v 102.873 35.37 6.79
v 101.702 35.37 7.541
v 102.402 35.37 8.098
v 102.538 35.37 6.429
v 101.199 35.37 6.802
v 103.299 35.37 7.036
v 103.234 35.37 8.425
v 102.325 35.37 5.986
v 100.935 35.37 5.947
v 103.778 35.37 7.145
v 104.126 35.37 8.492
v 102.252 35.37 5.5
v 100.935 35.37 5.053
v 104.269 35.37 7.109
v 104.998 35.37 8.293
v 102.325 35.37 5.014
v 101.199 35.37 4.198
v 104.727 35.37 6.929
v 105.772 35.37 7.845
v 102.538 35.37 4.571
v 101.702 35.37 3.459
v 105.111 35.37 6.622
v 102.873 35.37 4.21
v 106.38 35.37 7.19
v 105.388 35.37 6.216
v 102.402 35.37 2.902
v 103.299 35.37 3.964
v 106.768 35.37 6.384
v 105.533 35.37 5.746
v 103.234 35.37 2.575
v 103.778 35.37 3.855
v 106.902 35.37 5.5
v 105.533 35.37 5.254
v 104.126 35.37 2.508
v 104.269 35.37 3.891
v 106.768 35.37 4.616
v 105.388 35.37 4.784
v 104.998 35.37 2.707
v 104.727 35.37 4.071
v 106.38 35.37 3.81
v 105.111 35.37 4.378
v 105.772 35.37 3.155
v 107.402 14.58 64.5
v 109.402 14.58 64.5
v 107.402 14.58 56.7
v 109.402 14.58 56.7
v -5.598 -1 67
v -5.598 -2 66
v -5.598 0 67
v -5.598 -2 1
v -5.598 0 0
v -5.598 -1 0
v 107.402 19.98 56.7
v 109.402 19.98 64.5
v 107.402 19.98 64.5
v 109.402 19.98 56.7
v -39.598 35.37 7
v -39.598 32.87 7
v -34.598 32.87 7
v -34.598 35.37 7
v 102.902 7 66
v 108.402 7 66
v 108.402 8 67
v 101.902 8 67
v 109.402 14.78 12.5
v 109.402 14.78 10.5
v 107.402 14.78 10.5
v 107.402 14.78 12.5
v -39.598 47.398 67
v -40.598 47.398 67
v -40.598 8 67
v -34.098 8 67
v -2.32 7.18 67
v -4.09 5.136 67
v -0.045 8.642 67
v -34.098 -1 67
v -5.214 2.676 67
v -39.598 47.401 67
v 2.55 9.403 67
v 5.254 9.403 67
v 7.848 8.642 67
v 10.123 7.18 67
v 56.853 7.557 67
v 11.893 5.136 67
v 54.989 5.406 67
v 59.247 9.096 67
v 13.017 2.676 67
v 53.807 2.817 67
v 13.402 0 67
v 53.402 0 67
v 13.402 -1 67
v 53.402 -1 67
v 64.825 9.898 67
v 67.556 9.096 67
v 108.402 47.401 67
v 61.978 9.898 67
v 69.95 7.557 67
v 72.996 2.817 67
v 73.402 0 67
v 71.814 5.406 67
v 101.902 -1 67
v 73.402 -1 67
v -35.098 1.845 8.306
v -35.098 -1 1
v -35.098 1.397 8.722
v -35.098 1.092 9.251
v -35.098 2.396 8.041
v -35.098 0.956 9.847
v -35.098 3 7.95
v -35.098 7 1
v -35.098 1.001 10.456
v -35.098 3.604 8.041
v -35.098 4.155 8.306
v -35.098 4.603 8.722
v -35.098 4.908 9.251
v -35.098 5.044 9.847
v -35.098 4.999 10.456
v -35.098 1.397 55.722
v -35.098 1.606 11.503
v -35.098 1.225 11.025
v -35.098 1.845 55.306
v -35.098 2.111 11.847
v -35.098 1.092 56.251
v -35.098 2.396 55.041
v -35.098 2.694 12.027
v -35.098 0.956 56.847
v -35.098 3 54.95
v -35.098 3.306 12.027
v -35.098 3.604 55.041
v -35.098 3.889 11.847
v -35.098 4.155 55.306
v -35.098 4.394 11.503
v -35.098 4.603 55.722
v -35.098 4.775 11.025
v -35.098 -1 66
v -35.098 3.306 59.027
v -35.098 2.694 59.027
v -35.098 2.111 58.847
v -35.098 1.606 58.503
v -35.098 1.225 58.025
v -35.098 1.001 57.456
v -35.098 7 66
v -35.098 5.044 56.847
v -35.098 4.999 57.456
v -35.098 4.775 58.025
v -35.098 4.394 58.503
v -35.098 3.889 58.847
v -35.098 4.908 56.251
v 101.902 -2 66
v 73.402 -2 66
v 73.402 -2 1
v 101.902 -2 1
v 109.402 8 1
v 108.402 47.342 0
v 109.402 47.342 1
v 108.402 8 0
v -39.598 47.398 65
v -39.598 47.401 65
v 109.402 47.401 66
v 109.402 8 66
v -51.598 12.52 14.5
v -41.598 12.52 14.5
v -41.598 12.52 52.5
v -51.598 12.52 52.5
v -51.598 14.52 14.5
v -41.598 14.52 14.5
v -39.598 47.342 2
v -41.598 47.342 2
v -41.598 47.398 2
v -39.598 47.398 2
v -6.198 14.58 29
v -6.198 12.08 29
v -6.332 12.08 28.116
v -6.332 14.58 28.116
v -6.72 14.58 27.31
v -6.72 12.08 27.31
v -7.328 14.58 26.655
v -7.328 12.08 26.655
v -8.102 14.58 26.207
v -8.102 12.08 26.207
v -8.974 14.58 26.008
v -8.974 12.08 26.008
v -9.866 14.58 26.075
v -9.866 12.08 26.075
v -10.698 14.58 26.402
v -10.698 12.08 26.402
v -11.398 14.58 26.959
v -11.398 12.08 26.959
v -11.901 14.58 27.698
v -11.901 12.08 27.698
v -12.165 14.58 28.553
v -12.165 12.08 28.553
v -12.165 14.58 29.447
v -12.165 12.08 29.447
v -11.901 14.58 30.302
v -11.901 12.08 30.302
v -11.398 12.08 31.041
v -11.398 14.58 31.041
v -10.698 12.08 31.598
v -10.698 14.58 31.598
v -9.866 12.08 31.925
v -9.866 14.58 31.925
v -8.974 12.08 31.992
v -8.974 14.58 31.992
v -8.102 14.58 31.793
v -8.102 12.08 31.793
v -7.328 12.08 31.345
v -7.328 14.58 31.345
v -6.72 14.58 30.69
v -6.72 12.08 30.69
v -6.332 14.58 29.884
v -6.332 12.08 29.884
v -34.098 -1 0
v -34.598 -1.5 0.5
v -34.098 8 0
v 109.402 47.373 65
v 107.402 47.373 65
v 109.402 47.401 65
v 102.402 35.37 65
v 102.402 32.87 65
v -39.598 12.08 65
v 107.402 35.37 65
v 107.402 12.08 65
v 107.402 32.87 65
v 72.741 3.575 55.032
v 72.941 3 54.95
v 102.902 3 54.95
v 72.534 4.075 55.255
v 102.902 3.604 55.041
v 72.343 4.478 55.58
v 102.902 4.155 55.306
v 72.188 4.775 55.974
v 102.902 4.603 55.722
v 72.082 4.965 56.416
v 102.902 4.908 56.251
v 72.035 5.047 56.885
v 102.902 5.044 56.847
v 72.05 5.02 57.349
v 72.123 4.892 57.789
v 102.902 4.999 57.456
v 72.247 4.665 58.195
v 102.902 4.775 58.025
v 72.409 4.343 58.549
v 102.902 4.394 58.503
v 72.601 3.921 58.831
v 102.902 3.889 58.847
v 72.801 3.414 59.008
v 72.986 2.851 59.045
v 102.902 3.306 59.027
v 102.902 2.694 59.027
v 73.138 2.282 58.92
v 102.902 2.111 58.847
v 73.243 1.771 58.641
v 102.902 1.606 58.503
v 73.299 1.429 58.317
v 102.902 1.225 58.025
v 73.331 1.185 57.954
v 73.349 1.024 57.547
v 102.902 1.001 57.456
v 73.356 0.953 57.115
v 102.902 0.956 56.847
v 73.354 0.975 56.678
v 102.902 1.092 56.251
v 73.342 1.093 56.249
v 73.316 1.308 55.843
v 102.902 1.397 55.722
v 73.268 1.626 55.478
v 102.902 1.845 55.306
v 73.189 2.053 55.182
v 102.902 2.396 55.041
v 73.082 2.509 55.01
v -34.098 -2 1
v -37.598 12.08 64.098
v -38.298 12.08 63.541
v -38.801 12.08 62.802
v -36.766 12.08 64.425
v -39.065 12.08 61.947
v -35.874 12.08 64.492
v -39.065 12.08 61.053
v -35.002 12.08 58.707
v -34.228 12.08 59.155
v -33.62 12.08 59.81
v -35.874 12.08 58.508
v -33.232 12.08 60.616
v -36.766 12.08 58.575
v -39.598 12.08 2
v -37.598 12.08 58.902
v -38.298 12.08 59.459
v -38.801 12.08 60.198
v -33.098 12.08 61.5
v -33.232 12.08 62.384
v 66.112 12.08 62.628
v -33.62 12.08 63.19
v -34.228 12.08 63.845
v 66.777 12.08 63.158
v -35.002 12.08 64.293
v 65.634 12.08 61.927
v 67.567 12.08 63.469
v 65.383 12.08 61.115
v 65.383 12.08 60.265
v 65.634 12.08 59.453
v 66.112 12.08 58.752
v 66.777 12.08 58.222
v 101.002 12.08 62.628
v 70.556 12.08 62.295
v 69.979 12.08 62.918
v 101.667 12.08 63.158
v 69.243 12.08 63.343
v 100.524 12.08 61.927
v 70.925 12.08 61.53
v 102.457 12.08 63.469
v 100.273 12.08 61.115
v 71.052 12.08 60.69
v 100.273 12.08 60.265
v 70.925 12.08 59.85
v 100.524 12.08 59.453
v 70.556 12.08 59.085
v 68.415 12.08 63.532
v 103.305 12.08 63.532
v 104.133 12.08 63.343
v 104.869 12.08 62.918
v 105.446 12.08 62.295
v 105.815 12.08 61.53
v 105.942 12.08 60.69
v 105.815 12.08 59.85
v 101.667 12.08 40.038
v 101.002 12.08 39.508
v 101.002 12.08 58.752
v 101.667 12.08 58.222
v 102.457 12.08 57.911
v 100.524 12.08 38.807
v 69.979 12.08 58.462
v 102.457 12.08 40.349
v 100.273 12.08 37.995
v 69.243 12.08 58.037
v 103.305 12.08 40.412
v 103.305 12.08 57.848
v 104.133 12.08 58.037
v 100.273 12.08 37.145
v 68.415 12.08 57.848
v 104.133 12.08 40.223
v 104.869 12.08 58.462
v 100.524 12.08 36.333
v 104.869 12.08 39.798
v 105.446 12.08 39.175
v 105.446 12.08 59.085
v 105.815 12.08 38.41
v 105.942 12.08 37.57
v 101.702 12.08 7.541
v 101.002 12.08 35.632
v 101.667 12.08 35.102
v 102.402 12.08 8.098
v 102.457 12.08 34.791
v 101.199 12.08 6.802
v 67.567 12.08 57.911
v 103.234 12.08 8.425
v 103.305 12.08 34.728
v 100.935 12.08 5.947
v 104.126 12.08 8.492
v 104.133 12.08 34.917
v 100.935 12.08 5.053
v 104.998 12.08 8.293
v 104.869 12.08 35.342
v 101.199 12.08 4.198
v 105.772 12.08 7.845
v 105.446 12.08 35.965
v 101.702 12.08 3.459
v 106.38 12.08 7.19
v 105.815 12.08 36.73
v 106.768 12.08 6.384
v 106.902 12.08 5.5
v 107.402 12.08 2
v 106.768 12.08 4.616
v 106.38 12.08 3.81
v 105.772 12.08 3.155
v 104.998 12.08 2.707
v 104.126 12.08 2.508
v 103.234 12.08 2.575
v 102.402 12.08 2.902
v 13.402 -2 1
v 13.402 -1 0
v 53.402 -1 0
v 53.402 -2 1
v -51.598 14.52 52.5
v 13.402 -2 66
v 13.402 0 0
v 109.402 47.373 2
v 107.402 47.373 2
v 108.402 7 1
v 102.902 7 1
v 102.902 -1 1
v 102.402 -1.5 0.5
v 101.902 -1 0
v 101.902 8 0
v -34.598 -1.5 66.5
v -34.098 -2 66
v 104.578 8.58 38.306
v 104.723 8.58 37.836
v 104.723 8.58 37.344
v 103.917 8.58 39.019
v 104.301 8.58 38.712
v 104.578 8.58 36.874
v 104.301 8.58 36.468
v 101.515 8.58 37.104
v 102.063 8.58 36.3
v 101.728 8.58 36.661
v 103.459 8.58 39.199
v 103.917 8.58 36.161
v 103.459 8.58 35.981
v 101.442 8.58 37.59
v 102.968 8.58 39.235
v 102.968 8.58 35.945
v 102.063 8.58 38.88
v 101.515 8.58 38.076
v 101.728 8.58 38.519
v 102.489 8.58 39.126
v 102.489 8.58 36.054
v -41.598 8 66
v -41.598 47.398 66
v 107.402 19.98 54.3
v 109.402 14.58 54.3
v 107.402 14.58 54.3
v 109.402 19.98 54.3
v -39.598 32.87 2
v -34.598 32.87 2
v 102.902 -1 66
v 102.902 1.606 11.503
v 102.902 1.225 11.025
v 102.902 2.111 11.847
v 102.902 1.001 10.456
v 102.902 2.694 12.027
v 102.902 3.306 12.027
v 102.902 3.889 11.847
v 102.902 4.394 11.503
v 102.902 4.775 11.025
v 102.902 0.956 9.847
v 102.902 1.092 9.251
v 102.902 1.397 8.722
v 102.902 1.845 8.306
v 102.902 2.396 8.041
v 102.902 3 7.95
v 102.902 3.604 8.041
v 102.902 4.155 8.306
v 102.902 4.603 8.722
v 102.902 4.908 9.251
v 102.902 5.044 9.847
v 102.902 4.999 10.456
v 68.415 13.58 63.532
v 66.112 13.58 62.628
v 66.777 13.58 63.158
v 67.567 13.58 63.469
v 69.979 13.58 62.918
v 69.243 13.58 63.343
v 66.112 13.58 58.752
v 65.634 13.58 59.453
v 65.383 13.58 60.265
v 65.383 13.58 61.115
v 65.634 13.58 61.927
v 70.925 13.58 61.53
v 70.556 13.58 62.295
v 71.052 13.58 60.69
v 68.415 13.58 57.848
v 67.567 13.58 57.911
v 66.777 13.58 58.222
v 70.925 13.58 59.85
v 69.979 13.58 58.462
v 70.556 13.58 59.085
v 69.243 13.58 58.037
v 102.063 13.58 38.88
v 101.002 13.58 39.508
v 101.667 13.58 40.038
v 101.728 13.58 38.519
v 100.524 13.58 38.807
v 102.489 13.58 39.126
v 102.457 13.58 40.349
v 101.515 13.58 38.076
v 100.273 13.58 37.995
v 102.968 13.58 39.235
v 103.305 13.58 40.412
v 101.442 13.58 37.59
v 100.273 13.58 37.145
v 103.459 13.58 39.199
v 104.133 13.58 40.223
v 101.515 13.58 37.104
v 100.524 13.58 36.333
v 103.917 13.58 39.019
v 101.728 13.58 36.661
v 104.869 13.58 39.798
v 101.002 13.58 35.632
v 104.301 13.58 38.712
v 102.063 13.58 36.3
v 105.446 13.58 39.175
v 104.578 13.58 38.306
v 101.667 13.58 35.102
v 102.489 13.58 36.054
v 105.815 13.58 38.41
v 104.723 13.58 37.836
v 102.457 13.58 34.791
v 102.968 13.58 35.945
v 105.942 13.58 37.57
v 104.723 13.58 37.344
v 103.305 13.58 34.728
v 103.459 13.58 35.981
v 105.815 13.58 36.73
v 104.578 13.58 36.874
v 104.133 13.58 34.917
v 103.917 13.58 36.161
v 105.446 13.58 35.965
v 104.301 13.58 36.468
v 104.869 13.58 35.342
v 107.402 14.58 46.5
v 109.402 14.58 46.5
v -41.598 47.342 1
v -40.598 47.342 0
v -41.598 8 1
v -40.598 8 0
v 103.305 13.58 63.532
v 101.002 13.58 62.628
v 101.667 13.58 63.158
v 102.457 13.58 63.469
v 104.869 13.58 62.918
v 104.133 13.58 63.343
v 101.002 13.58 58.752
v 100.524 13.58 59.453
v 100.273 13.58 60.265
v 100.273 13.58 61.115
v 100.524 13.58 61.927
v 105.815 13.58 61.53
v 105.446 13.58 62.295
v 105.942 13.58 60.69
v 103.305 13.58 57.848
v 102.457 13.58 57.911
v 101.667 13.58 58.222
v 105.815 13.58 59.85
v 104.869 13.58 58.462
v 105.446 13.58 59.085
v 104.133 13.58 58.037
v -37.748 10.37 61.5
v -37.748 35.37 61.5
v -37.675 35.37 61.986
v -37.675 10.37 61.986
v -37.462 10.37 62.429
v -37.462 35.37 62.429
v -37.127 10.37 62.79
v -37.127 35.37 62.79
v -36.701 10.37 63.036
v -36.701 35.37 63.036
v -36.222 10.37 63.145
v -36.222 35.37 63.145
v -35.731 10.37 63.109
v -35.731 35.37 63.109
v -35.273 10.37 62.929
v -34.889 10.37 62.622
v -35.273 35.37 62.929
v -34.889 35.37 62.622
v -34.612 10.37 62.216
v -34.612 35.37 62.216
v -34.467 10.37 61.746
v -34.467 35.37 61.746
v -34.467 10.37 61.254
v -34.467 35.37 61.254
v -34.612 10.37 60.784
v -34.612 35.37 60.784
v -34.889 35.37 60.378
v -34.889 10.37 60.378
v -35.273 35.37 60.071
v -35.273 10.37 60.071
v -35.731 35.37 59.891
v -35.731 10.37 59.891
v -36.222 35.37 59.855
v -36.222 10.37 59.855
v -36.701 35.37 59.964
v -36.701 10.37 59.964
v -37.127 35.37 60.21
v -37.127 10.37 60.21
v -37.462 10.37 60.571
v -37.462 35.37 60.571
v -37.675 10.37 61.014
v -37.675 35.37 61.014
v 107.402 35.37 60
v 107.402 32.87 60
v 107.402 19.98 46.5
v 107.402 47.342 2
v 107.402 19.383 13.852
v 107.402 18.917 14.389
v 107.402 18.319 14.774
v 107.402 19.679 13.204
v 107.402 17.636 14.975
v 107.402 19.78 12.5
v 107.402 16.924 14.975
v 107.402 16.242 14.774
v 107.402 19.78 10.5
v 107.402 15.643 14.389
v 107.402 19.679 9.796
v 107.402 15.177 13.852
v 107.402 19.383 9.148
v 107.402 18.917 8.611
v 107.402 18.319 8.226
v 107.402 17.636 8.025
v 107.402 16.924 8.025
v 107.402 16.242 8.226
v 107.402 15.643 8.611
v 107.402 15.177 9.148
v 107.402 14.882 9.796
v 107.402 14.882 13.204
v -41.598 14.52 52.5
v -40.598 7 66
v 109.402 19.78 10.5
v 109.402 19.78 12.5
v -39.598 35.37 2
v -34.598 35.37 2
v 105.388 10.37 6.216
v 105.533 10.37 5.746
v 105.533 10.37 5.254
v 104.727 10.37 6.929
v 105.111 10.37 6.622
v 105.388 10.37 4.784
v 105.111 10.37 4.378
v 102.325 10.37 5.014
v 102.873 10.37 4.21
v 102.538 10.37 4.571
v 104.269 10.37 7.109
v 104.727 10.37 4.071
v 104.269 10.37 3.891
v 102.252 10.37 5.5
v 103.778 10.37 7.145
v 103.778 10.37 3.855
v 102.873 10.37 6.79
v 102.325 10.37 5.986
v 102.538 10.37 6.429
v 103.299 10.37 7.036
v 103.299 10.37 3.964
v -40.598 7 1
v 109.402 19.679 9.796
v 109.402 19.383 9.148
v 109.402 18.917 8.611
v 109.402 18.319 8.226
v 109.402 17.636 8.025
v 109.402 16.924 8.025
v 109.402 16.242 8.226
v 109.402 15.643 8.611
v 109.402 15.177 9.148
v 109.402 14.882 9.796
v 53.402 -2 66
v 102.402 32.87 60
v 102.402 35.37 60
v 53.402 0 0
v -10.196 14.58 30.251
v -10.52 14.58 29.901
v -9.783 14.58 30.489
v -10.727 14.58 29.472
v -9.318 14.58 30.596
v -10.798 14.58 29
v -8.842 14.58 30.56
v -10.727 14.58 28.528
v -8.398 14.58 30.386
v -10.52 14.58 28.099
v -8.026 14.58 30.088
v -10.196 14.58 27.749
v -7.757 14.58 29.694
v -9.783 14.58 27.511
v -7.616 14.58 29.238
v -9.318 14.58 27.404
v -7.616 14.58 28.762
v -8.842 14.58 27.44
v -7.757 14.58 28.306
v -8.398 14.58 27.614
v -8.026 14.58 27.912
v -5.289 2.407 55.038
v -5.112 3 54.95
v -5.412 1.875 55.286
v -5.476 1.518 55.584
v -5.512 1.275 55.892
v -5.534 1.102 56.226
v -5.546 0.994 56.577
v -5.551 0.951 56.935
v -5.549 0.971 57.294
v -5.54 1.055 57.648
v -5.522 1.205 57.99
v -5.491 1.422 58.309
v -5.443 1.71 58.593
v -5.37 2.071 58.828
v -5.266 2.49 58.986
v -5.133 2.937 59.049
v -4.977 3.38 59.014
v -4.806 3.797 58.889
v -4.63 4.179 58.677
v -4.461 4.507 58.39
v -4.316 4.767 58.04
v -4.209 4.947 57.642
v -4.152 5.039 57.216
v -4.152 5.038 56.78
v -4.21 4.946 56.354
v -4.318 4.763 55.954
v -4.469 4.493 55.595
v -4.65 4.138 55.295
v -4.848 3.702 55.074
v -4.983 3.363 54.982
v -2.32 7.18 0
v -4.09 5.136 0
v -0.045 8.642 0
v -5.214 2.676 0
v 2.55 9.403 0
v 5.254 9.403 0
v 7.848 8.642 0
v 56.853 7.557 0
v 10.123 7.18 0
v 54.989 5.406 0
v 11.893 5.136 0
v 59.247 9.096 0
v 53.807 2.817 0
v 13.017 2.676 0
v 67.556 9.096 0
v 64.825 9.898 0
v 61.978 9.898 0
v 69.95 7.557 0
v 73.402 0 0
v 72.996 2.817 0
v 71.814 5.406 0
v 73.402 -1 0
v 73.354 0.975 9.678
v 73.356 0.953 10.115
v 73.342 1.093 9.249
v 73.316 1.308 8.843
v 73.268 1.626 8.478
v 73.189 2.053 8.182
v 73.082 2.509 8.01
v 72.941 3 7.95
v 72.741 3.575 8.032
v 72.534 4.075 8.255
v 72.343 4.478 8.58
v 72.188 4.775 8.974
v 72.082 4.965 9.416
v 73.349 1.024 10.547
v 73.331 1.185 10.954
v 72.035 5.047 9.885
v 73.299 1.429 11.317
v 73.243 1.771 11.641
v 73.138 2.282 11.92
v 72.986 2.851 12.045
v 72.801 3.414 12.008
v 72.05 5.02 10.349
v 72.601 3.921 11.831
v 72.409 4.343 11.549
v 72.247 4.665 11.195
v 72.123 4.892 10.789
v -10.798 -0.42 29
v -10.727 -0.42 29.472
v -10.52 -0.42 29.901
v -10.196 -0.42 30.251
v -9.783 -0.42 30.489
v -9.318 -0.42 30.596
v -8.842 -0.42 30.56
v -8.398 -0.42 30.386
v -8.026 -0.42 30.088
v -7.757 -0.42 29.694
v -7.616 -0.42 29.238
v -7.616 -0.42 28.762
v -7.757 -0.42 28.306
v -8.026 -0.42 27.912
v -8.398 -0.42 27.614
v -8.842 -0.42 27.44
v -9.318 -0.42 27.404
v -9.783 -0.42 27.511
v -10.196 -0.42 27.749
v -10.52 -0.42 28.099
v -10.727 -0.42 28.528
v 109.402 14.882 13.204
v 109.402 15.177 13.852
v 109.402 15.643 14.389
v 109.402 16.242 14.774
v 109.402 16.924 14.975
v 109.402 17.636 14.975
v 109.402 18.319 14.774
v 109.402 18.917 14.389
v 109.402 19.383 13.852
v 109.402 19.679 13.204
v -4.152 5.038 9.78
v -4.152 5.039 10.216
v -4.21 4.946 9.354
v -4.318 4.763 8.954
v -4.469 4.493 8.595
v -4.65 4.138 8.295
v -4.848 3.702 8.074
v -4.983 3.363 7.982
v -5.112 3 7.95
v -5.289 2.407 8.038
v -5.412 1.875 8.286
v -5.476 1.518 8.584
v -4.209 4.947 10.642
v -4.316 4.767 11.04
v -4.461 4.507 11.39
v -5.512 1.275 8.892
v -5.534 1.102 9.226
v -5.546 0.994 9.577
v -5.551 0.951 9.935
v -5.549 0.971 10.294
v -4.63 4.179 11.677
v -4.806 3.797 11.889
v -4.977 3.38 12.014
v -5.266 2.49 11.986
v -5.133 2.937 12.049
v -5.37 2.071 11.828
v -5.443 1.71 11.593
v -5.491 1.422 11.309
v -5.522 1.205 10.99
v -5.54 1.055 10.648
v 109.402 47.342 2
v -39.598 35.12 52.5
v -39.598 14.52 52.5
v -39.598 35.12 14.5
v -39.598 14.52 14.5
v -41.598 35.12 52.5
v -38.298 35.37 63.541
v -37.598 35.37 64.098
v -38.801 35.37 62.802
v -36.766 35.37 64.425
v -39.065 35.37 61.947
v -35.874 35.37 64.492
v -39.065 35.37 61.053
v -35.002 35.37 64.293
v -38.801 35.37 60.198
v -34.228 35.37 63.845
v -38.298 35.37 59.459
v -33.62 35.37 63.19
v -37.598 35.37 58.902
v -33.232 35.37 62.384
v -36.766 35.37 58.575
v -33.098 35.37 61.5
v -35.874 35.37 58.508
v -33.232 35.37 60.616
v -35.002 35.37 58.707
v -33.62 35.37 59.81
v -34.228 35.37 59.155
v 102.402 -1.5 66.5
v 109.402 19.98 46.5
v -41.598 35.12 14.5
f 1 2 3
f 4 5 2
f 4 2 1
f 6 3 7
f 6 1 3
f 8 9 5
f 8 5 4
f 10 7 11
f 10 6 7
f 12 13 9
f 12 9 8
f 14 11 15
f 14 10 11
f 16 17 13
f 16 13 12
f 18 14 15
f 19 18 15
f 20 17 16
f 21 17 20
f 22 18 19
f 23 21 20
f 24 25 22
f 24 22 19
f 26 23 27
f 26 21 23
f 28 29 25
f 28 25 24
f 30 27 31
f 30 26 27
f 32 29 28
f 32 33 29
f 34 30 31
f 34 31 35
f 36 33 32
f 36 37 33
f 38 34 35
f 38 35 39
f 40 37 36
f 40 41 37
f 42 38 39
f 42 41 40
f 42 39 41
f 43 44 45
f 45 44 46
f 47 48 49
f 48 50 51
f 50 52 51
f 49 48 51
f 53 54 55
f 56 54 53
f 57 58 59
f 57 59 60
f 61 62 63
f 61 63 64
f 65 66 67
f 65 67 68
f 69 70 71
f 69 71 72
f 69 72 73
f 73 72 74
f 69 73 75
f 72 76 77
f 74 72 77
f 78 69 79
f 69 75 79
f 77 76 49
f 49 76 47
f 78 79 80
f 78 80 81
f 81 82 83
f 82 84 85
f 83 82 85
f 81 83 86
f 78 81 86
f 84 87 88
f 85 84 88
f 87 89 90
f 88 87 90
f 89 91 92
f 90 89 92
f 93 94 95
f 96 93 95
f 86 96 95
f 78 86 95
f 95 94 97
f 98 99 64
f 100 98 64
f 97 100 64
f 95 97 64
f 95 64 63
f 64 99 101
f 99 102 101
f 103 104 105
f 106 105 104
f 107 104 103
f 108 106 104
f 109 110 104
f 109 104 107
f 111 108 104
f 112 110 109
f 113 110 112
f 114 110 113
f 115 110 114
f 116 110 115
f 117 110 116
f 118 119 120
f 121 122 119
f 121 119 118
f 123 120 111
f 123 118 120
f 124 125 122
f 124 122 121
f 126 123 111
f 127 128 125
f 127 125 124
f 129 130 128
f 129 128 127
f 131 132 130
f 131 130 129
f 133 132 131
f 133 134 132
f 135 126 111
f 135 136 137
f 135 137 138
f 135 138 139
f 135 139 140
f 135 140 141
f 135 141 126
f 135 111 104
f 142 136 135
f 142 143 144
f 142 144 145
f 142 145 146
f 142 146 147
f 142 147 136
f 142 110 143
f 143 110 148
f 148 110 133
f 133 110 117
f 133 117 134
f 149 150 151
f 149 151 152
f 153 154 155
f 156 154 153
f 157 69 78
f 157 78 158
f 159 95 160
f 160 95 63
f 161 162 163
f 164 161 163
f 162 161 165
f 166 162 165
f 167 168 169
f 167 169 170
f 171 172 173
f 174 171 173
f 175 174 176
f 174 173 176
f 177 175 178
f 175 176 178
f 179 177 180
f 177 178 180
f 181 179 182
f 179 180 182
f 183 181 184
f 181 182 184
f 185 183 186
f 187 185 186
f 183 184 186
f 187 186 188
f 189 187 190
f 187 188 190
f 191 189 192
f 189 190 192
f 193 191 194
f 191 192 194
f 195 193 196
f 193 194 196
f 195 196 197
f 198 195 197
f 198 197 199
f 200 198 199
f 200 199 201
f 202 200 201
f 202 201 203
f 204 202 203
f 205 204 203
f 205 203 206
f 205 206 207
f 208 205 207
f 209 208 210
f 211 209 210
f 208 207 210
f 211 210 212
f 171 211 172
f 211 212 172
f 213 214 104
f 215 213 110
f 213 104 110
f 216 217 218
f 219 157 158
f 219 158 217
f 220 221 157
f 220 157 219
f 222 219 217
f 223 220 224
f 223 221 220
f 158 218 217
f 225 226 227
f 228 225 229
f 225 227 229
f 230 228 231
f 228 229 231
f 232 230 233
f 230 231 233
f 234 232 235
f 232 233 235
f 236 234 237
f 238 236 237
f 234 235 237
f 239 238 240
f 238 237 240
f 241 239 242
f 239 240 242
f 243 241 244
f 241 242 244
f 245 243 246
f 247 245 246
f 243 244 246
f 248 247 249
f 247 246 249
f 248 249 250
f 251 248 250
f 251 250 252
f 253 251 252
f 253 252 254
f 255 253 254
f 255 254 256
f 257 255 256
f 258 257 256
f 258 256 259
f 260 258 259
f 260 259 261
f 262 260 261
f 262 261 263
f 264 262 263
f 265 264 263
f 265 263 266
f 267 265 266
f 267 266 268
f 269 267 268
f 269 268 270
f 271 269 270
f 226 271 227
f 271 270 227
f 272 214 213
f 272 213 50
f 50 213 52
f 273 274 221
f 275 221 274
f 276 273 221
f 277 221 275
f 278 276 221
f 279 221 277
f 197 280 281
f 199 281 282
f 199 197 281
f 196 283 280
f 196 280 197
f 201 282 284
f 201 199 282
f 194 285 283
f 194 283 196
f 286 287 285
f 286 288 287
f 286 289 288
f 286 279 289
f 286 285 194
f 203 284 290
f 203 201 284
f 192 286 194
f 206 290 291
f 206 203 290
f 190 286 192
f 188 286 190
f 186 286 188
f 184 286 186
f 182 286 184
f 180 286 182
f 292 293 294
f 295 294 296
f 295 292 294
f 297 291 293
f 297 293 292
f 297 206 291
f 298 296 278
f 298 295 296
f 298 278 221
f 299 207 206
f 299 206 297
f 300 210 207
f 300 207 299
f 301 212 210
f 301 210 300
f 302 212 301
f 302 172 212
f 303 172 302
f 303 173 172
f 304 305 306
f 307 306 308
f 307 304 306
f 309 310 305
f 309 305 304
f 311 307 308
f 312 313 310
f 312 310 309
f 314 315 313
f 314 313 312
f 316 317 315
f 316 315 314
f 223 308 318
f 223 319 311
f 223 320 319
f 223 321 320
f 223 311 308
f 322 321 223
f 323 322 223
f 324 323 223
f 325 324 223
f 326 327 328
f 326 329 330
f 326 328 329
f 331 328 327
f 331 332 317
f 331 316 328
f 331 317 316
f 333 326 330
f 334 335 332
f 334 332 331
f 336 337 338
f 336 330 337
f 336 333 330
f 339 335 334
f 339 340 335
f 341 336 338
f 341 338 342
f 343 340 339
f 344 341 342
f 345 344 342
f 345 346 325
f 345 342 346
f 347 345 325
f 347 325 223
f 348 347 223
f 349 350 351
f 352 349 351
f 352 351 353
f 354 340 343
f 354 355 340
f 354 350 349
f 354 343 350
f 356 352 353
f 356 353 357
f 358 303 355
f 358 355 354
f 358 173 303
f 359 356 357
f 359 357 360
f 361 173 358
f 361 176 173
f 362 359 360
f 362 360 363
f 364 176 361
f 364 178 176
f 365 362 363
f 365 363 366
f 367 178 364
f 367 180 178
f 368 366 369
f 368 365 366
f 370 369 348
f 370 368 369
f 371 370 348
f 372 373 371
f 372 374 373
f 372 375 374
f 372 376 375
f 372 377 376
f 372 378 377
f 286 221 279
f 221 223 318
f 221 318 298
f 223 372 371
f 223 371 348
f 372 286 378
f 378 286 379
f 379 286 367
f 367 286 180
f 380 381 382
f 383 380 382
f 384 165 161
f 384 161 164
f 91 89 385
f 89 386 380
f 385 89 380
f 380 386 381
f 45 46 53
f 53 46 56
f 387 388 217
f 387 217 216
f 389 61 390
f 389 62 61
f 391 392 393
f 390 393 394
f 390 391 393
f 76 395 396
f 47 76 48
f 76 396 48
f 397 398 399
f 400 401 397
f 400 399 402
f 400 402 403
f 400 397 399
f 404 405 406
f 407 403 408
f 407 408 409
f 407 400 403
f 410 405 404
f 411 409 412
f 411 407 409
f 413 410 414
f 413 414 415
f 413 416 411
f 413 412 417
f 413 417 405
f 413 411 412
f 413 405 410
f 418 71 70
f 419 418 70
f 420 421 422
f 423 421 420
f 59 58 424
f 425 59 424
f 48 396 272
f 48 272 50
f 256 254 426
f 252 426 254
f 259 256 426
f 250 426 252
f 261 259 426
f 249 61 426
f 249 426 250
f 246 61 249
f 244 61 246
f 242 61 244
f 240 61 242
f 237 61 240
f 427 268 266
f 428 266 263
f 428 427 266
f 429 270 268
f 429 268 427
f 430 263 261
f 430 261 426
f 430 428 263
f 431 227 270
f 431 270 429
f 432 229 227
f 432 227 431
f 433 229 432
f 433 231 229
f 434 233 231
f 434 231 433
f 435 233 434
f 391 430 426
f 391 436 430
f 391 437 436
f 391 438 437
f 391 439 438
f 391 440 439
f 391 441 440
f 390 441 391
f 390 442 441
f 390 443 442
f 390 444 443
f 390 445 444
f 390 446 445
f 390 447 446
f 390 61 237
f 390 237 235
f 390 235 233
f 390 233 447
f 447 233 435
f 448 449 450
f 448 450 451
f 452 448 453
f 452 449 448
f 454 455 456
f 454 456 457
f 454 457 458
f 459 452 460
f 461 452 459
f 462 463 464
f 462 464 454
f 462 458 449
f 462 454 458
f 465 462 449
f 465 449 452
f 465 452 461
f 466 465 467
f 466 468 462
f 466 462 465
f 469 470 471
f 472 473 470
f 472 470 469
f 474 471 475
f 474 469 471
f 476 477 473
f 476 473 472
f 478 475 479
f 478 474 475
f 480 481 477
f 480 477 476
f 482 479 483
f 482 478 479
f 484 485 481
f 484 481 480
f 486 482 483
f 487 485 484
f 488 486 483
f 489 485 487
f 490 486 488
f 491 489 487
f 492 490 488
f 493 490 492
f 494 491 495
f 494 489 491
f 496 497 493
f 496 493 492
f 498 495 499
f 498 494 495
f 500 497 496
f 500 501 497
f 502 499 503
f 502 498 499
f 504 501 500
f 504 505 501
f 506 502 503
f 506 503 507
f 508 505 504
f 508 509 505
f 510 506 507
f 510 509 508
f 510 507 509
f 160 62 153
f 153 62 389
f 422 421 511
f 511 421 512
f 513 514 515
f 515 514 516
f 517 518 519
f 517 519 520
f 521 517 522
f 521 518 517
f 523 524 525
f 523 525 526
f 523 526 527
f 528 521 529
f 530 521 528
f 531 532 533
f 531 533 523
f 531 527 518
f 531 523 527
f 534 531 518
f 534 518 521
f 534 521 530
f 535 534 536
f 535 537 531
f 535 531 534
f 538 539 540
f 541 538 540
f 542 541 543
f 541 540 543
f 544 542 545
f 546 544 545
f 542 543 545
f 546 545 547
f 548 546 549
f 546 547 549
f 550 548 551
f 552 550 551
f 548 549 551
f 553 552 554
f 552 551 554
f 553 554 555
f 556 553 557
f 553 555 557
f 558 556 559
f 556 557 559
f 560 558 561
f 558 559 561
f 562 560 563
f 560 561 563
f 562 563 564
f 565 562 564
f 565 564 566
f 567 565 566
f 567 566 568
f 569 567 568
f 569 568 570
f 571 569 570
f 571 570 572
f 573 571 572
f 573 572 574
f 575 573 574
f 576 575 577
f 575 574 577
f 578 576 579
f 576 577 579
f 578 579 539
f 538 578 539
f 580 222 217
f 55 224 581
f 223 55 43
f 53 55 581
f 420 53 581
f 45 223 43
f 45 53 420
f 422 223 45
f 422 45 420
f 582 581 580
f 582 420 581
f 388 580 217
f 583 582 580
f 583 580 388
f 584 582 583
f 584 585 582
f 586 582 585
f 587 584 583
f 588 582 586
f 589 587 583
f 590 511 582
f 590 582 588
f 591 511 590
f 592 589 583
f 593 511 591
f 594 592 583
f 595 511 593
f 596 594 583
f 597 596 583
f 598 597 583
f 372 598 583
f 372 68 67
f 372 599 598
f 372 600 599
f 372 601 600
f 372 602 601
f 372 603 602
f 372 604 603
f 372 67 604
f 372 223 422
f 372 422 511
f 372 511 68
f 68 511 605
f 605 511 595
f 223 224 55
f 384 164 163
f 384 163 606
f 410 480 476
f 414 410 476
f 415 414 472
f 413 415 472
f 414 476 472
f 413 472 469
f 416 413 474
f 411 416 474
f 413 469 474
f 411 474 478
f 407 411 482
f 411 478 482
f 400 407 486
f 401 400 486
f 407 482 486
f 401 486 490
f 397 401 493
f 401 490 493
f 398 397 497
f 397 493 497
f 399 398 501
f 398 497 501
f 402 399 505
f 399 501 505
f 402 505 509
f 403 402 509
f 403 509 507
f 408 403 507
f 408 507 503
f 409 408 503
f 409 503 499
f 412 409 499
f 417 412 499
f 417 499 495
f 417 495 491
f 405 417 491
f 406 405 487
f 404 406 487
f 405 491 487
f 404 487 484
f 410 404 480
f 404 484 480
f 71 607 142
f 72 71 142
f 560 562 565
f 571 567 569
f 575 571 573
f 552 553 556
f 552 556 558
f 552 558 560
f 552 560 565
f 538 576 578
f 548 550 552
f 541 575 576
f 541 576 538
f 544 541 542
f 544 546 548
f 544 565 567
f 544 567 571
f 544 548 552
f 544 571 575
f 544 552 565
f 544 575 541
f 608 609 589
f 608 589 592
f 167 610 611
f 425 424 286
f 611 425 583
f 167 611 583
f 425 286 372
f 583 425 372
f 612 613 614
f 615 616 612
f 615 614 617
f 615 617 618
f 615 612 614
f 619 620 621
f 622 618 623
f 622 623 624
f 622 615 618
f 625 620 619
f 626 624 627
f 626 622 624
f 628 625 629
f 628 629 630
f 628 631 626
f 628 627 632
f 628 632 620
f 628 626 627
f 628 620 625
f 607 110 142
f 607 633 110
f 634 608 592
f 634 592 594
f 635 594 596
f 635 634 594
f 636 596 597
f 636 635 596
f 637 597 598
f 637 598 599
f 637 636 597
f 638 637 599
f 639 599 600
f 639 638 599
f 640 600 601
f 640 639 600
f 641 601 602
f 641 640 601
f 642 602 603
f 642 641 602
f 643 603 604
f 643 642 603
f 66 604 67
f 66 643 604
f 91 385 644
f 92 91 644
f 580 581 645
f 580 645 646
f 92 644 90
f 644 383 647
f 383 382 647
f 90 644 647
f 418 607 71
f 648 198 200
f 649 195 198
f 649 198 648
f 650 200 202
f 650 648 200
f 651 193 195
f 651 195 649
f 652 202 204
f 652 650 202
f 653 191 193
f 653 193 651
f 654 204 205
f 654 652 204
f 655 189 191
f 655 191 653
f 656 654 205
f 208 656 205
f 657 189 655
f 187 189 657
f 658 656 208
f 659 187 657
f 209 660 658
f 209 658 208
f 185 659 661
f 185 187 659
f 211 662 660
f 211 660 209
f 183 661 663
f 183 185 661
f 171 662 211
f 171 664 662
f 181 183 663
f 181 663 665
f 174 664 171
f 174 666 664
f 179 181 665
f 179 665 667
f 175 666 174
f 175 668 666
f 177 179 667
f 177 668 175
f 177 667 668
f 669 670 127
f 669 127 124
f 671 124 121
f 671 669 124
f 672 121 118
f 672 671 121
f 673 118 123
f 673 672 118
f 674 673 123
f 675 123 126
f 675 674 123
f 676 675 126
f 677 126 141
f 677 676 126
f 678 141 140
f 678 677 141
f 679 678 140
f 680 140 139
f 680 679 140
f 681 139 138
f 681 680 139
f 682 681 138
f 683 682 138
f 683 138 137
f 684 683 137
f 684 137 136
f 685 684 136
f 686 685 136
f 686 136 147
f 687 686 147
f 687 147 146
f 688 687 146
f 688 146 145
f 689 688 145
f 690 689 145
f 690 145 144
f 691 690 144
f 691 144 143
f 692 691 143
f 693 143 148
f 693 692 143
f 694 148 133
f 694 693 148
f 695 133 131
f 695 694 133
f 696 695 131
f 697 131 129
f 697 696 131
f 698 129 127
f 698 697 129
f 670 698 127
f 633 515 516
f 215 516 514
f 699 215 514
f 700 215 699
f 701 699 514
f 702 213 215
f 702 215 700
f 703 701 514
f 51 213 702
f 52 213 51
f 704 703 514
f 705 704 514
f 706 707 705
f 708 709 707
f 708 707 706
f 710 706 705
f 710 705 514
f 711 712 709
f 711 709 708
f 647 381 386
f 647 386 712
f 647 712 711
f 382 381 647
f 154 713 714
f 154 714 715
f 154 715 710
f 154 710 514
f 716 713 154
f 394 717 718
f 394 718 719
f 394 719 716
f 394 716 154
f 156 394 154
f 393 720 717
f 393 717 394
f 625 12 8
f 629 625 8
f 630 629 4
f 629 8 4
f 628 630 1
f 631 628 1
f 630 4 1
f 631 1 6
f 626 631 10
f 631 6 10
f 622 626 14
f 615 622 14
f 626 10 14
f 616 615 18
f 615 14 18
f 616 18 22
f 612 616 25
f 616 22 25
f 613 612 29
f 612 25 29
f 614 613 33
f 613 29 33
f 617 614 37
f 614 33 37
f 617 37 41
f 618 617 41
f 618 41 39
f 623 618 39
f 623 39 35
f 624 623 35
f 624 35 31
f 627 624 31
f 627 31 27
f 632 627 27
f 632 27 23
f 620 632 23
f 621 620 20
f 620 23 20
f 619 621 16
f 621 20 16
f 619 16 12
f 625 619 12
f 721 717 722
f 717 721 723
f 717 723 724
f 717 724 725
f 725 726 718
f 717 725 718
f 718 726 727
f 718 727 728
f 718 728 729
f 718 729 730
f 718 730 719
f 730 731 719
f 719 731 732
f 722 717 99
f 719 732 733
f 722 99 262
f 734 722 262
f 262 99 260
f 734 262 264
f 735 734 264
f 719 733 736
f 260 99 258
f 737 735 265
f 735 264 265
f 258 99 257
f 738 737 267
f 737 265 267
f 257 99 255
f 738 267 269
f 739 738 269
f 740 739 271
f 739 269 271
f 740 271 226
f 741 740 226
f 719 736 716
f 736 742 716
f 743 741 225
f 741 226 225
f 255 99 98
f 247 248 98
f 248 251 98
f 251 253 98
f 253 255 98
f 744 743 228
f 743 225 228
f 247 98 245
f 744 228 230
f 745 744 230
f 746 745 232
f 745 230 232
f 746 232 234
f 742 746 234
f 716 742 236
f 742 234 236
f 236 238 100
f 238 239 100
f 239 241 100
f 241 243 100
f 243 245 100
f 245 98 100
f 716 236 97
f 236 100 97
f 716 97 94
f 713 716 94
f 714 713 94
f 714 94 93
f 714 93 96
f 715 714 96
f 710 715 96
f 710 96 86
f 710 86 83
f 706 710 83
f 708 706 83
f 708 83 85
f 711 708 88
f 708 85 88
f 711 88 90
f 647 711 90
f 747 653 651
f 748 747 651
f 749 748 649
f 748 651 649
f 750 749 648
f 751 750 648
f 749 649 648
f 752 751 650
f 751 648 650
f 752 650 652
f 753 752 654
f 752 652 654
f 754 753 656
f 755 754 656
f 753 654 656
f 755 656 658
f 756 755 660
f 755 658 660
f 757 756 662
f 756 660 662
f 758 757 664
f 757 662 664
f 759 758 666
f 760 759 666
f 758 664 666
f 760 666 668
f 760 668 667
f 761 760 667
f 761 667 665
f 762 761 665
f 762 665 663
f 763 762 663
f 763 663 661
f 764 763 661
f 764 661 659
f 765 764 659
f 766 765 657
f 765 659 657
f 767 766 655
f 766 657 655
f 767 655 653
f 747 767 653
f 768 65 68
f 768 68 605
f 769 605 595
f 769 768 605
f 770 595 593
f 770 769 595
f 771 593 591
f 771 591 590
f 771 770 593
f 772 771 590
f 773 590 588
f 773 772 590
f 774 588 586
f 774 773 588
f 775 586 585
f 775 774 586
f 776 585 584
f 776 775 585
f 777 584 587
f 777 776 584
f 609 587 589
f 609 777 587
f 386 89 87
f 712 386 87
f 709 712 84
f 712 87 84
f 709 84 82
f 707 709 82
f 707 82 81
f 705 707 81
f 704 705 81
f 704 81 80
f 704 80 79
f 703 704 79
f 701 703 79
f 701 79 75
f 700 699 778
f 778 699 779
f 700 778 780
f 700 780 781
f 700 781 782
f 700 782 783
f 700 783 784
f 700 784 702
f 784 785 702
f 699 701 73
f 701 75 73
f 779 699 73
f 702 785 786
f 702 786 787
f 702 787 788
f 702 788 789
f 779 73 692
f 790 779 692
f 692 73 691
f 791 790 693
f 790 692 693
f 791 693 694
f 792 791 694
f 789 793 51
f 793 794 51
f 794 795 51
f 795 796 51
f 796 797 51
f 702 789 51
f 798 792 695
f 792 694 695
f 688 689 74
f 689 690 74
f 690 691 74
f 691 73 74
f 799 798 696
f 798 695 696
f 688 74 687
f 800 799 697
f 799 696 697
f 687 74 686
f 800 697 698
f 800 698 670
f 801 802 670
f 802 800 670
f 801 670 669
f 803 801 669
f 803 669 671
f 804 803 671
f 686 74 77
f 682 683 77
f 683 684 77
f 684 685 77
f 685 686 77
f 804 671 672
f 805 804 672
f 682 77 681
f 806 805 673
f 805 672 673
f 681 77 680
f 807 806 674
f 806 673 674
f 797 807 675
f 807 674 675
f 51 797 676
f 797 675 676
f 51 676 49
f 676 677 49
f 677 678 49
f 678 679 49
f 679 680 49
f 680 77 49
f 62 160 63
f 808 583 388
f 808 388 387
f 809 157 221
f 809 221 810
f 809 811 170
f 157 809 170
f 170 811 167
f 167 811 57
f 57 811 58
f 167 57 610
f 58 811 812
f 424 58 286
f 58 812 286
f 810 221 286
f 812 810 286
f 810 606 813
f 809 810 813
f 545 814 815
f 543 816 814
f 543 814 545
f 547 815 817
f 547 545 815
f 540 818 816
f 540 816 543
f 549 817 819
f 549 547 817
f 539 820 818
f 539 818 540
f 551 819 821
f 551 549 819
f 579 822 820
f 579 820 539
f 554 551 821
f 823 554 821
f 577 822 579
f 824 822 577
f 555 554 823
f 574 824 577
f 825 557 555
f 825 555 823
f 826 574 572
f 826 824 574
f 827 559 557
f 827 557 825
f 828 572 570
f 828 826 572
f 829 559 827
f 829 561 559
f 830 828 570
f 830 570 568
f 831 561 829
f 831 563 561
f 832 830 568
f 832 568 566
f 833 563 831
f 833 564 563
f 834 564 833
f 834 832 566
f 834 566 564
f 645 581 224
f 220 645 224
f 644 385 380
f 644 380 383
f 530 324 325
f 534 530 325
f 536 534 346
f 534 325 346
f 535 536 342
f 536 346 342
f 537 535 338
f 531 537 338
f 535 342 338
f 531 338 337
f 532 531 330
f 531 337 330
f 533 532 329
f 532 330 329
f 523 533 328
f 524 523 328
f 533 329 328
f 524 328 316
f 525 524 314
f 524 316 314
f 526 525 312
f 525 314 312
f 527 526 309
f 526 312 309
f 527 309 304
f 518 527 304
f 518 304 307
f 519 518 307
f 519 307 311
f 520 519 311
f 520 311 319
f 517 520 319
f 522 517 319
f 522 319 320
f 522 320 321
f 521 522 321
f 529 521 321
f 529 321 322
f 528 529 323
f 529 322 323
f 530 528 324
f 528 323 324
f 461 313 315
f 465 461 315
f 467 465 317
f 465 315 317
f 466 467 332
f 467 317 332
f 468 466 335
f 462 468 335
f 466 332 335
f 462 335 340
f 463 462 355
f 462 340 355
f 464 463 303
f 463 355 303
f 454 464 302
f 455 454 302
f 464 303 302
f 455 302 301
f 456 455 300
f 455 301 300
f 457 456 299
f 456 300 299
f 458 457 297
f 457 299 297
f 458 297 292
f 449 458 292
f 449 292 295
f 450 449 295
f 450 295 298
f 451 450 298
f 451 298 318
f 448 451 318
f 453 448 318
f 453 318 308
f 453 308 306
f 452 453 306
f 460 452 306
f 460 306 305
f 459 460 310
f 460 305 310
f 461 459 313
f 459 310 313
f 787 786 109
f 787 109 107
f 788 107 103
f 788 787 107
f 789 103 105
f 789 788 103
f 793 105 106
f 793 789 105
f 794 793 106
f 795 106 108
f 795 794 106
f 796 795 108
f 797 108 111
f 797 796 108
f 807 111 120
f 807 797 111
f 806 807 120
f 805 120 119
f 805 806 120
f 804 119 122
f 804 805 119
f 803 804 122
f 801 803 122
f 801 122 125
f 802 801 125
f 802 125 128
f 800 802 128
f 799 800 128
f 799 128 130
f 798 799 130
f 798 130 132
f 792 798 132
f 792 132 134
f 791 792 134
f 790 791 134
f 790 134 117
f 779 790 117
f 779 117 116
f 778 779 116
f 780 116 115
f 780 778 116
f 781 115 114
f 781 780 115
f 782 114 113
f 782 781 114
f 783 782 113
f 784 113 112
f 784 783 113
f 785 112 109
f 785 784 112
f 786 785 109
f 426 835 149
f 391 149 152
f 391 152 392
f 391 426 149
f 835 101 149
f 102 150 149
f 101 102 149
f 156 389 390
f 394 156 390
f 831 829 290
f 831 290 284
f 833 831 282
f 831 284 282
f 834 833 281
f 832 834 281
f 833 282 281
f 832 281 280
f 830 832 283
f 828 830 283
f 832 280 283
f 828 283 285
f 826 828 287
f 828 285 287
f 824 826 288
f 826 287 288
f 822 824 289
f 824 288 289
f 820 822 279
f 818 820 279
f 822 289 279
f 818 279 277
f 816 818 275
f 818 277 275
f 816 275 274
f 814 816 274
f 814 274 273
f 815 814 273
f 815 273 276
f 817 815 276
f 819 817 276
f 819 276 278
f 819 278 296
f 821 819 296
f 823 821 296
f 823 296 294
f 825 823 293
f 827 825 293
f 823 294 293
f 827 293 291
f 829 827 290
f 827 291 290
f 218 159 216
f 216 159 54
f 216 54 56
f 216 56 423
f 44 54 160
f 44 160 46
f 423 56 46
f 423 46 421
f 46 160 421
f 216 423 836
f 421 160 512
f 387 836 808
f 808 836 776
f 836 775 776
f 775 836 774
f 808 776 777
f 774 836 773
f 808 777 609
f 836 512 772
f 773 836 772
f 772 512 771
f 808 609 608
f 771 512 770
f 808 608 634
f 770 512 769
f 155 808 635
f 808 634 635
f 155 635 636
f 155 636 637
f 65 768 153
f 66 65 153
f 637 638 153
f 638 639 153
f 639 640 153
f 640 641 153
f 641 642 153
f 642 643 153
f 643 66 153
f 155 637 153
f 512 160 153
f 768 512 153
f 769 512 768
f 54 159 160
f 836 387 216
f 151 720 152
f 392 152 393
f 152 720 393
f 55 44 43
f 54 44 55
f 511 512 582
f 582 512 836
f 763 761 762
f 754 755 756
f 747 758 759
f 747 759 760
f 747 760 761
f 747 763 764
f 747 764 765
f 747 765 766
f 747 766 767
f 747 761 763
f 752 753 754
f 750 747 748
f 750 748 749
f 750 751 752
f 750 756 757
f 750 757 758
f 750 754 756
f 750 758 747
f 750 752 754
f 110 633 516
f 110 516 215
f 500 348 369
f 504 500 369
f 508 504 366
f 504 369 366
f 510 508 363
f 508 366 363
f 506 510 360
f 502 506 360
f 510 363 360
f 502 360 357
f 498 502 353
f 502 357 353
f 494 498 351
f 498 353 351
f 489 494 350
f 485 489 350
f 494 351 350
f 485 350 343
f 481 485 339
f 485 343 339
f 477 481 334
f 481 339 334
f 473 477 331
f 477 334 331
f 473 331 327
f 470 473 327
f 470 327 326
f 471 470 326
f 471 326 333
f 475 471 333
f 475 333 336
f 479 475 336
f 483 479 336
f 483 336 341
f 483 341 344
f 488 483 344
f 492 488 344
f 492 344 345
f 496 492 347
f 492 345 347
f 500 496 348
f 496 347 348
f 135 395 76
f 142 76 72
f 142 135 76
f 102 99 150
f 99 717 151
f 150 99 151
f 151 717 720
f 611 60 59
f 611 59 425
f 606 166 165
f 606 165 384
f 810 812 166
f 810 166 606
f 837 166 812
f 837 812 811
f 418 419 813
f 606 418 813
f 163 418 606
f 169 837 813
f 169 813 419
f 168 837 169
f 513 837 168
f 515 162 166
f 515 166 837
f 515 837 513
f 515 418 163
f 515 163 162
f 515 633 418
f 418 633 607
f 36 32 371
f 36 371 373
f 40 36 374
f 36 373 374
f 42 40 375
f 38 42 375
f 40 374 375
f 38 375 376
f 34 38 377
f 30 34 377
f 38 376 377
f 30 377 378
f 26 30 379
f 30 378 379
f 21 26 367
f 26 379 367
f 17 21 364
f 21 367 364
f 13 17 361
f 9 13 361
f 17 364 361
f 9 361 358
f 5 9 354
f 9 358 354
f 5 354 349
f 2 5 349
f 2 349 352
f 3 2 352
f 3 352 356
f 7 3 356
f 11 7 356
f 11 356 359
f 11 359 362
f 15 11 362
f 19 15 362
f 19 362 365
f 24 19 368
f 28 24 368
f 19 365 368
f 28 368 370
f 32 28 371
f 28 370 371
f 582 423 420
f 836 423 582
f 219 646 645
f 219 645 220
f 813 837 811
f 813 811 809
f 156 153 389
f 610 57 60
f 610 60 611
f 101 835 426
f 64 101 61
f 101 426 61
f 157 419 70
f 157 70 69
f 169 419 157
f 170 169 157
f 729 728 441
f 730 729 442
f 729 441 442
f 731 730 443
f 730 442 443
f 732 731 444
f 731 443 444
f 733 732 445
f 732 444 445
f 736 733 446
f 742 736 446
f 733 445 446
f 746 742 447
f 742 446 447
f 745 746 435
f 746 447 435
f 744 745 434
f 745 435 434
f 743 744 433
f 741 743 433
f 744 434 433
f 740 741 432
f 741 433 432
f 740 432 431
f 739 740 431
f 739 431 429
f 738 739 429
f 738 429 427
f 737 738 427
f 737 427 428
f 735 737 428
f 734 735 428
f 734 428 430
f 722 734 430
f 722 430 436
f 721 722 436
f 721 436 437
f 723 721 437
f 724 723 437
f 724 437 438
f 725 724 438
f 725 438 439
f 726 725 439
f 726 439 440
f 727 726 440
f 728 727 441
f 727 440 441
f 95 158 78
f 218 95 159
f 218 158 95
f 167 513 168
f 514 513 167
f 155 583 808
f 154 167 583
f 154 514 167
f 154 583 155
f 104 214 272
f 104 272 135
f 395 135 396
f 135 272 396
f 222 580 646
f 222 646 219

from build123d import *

# Parameters (mm, degrees)
AUFSATZ_LINEAR_AUSTRAGEN1_DEPTH  = 67
SKIZZE3_W                        = 151
SKIZZE3_H                        = 2
AUFSATZ_LINEAR_AUSTRAGEN2_DEPTH  = 47.34238026
SKIZZE4_W                        = 2
SKIZZE4_H                        = 65
AUFSATZ_LINEAR_AUSTRAGEN3_DEPTH  = 47.39811
SKIZZE6_W                        = 149
SKIZZE6_H                        = 2
AUFSATZ_LINEAR_AUSTRAGEN4_DEPTH  = 47.40101983
SKIZZE7_W                        = 2
SKIZZE7_H                        = 63
AUFSATZ_LINEAR_AUSTRAGEN5_DEPTH  = 47.37320267
SKIZZE20_W                       = 147
SKIZZE20_H                       = 12.080237494
AUFSATZ_LINEAR_AUSTRAGEN6_DEPTH  = 63
SCHNITT_LINEAR_AUSTRAGEN1_DEPTH  = 137.764615455
SKIZZE23_W                       = 7.8
SKIZZE23_H                       = 5.4
SCHNITT_LINEAR_AUSTRAGEN12_DEPTH = 47
SKIZZE26_R                       = 2.05
SCHNITT_LINEAR_AUSTRAGEN13_DEPTH = 38
SKIZZE28_R                       = 2.05
SCHNITT_LINEAR_AUSTRAGEN14_DEPTH = 38
SCHNITT_LINEAR_START             = -38
SKIZZE29_R                       = 2.05
SCHNITT_LINEAR_AUSTRAGEN15_DEPTH = 38
SKIZZE31_R                       = 2.05
SCHNITT_LINEAR_AUSTRAGEN16_DEPTH = 38
SKIZZE32_R                       = 3
AUFSATZ_LINEAR_AUSTRAGEN15_DEPTH = 23.29
SKIZZE33_R                       = 3
AUFSATZ_LINEAR_AUSTRAGEN16_DEPTH = 23.29
SKIZZE34_R                       = 1.65
SCHNITT_LINEAR_AUSTRAGEN17_DEPTH = 25
SKIZZE35_R                       = 1.65
SCHNITT_LINEAR_AUSTRAGEN18_DEPTH = 25
SKIZZE37_W                       = 67
SKIZZE37_H                       = 9
SCHNITT_LINEAR_AUSTRAGEN20_DEPTH = 6.5
SKIZZE38_W                       = 67
SKIZZE38_H                       = 9
SCHNITT_LINEAR_AUSTRAGEN21_DEPTH = 6.5
FASE2_SIZE                       = 1
FASE13_SIZE                      = 1
SKIZZE40_R                       = 2.85
AUFSATZ_LINEAR_AUSTRAGEN17_DEPTH = 1.5
SKIZZE41_R                       = 1.65
SCHNITT_LINEAR_AUSTRAGEN23_DEPTH = 5
SKIZZE42_R                       = 2.85
AUFSATZ_LINEAR_AUSTRAGEN18_DEPTH = 1.5
SCHNITT_LINEAR_AUSTRAGEN24_DEPTH = 2
SKIZZE46_W                       = 5
SKIZZE46_H                       = 2.5
AUFSATZ_LINEAR_AUSTRAGEN21_DEPTH = 5
SKIZZE47_W                       = 5
SKIZZE47_H                       = 2.5
AUFSATZ_LINEAR_AUSTRAGEN22_DEPTH = 5
SKIZZE48_W                       = 38
SKIZZE48_H                       = 20.6
SCHNITT_LINEAR_AUSTRAGEN25_DEPTH = 2
SKIZZE49_W                       = 38
SKIZZE49_H                       = 2
AUFSATZ_LINEAR_AUSTRAGEN23_DEPTH = 10
SKIZZE51_R                       = 3
AUFSATZ_LINEAR_AUSTRAGEN24_DEPTH = 2.5
SKIZZE52_R                       = 1.6
SCHNITT_LINEAR_AUSTRAGEN26_DEPTH = 15


with BuildPart() as part:
    # Skizze1 → Aufsatz-Linear austragen1 (new body)
    with BuildSketch(Plane.XY):
        with BuildLine():
            Line((13.401569275, 0), (13.401569275, -2))
            Line((13.401569275, -2), (53.401569275, -2))
            Line((53.401569275, -2), (53.401569275, 0))
            ThreePointArc((53.401569275, 0), (63.401569275, 10), (73.401569275, 0))
            Line((73.401569275, 0), (73.401569275, -2))
            Line((73.401569275, -2), (109.401569275, -2))
            Line((109.401569275, -2), (109.401569275, 0))
            Line((109.401569275, 0), (75.401569275, 0))
            ThreePointArc((75.401569275, 0), (63.401569275, 12), (51.401569275, 0))
            Line((51.401569275, 0), (15.488199501, 0))
            ThreePointArc((15.488199501, 0), (3.901569275, 8.877501001), (-7.685060952, 0))
            Line((-7.685060952, 0), (-41.598430725, 0))
            Line((-41.598430725, 0), (-41.598430725, -2))
            Line((-41.598430725, -2), (-5.598430725, -2))
            Line((-5.598430725, -2), (-5.598430725, 0))
            ThreePointArc((-5.598430725, 0), (3.901569275, 6.877501001), (13.401569275, 0))
        make_face()
    extrude(amount=AUFSATZ_LINEAR_AUSTRAGEN1_DEPTH)

    # Skizze3 → Aufsatz-Linear austragen2 (add)
    with BuildSketch(Plane(origin=(0, 0, 0), x_dir=(1, 0, 0), z_dir=(0, 1, 0))):
        with Locations((33.901569275, -1)):
            Rectangle(SKIZZE3_W, SKIZZE3_H)
    extrude(amount=AUFSATZ_LINEAR_AUSTRAGEN2_DEPTH)

    # Skizze4 → Aufsatz-Linear austragen3 (add)
    with BuildSketch(Plane(origin=(0, 0, 0), x_dir=(1, 0, 0), z_dir=(0, 1, 0))):
        with Locations((-40.598430725, -34.5)):
            Rectangle(SKIZZE4_W, SKIZZE4_H)
    extrude(amount=AUFSATZ_LINEAR_AUSTRAGEN3_DEPTH)

    # Skizze6 → Aufsatz-Linear austragen4 (add)
    with BuildSketch(Plane(origin=(0, 0, 0), x_dir=(1, 0, 0), z_dir=(0, 1, 0))):
        with Locations((34.901569275, -66)):
            Rectangle(SKIZZE6_W, SKIZZE6_H)
    extrude(amount=AUFSATZ_LINEAR_AUSTRAGEN4_DEPTH)

    # Skizze7 → Aufsatz-Linear austragen5 (add)
    with BuildSketch(Plane(origin=(0, 0, 0), x_dir=(1, 0, 0), z_dir=(0, 1, 0))):
        with Locations((108.401569275, -33.5)):
            Rectangle(SKIZZE7_W, SKIZZE7_H)
    extrude(amount=AUFSATZ_LINEAR_AUSTRAGEN5_DEPTH)

    # Skizze20 → Aufsatz-Linear austragen6 (add)
    with BuildSketch(Plane.XY.offset(2)):
        with Locations((33.901569275, 6.040118747)):
            Rectangle(SKIZZE20_W, SKIZZE20_H)
    extrude(amount=AUFSATZ_LINEAR_AUSTRAGEN6_DEPTH)

    # Skizze8 → Schnitt-Linear austragen1 (cut, through all)
    with BuildSketch(Plane.XY.offset(67)):
        with BuildLine():
            Line((53.401569275, 0), (73.401569275, 0))
            ThreePointArc((73.401569275, 0), (63.401569275, 10), (53.401569275, 0))
        make_face()
        with BuildLine():
            Line((-5.598430725, 0), (13.401569275, 0))
            ThreePointArc((13.401569275, 0), (3.901569275, 9.5), (-5.598430725, 0))
        make_face()
    extrude(amount=-SCHNITT_LINEAR_AUSTRAGEN1_DEPTH, mode=Mode.SUBTRACT)

    # Skizze23 → Schnitt-Linear austragen12 (cut)
    with BuildSketch(Plane(origin=(109.401569275, 0, 0), x_dir=(0, 0, -1), z_dir=(1, 0, 0))):
        with Locations((-60.6, 17.280237494)):
            Rectangle(SKIZZE23_W, SKIZZE23_H)
        with Locations((-50.4, 17.280237494)):
            Rectangle(SKIZZE23_W, SKIZZE23_H)
    extrude(amount=-SCHNITT_LINEAR_AUSTRAGEN12_DEPTH, mode=Mode.SUBTRACT)

    # Skizze26 → Schnitt-Linear austragen13 (cut)
    with BuildSketch(Plane(origin=(109.401569275, 0, 0), x_dir=(0, 0, -1), z_dir=(1, 0, 0))):
        with Locations((-57, 3)):
            Circle(SKIZZE26_R)
    extrude(amount=-SCHNITT_LINEAR_AUSTRAGEN13_DEPTH, mode=Mode.SUBTRACT)

    # Skizze28 → Schnitt-Linear austragen14 (cut)
    with BuildSketch(Plane(origin=(109.401569275, 0, 0), x_dir=(0, 0, -1), z_dir=(1, 0, 0))):
        with Locations((-10, 3)):
            Circle(SKIZZE28_R)
    extrude(amount=-SCHNITT_LINEAR_AUSTRAGEN14_DEPTH, mode=Mode.SUBTRACT)

    # Skizze29 → Schnitt-Linear austragen15 (cut)
    with BuildSketch(Plane.ZY.offset(41.598430725).offset(SCHNITT_LINEAR_START)):
        with Locations(Location((57, 3, 0), (0, 0, 180))):
            Circle(SKIZZE29_R)
    extrude(amount=SCHNITT_LINEAR_AUSTRAGEN15_DEPTH, mode=Mode.SUBTRACT)

    # Skizze31 → Schnitt-Linear austragen16 (cut)
    with BuildSketch(Plane.ZY.offset(41.598430725).offset(SCHNITT_LINEAR_START)):
        with Locations(Location((10, 3, 0), (0, 0, 180))):
            Circle(SKIZZE31_R)
    extrude(amount=SCHNITT_LINEAR_AUSTRAGEN16_DEPTH, mode=Mode.SUBTRACT)

    # Skizze32 → Aufsatz-Linear austragen15 (add)
    with BuildSketch(Plane(origin=(0, 12.080237494, 0), x_dir=(1, 0, 0), z_dir=(0, 1, 0))):
        with Locations((-36.098430725, -61.5)):
            Circle(SKIZZE32_R)
    extrude(amount=AUFSATZ_LINEAR_AUSTRAGEN15_DEPTH)

    # Skizze33 → Aufsatz-Linear austragen16 (add)
    with BuildSketch(Plane(origin=(0, 12.080237494, 0), x_dir=(1, 0, 0), z_dir=(0, 1, 0))):
        with Locations((103.901569275, -5.5)):
            Circle(SKIZZE33_R)
    extrude(amount=AUFSATZ_LINEAR_AUSTRAGEN16_DEPTH)

    # Skizze34 → Schnitt-Linear austragen17 (cut)
    with BuildSketch(Plane(origin=(0, 35.370237494, 0), x_dir=(1, 0, 0), z_dir=(0, 1, 0))):
        with Locations(Location((-36.098430725, -61.5, 0), (0, 0, 180))):
            Circle(SKIZZE34_R)
    extrude(amount=-SCHNITT_LINEAR_AUSTRAGEN17_DEPTH, mode=Mode.SUBTRACT)

    # Skizze35 → Schnitt-Linear austragen18 (cut)
    with BuildSketch(Plane(origin=(0, 35.370237494, 0), x_dir=(1, 0, 0), z_dir=(0, 1, 0))):
        with Locations(Location((103.901569275, -5.5, 0), (0, 0, 180))):
            Circle(SKIZZE35_R)
    extrude(amount=-SCHNITT_LINEAR_AUSTRAGEN18_DEPTH, mode=Mode.SUBTRACT)

    # Skizze37 → Schnitt-Linear austragen20 (cut)
    with BuildSketch(Plane(origin=(109.401569275, 0, 0), x_dir=(0, 0, -1), z_dir=(1, 0, 0))):
        with Locations((-33.5, 2.5)):
            Rectangle(SKIZZE37_W, SKIZZE37_H)
    extrude(amount=-SCHNITT_LINEAR_AUSTRAGEN20_DEPTH, mode=Mode.SUBTRACT)

    # Skizze38 → Schnitt-Linear austragen21 (cut)
    with BuildSketch(Plane.ZY.offset(41.598430725)):
        with Locations((33.5, 2.5)):
            Rectangle(SKIZZE38_W, SKIZZE38_H)
    extrude(amount=-SCHNITT_LINEAR_AUSTRAGEN21_DEPTH, mode=Mode.SUBTRACT)

    # Fase2
    fase2_edges = [part.edges().sort_by_distance(p)[0] for p in [
        (-41.598430725, 27.17119013, 0),
        (109.401569275, 27.17119013, 0),
        (109.401569275, 27.200509915, 67),
        (109.401569275, 7, 33.5),
        (102.901569275, 2.5, 67),
        (106.151569275, 7, 67),
        (102.901569275, 2.5, 0),
        (106.151569275, 7, 0),
        (102.901569275, -2, 33.5),
        (-41.598430725, 7, 33.5),
        (-35.098430725, 2.5, 0),
        (-38.348430725, 7, 0),
        (-35.098430725, 2.5, 67),
        (-38.348430725, 7, 67),
        (-35.098430725, -2, 33.5),
        (-41.598430725, 27.199055, 67),
    ]]
    chamfer(fase2_edges, length=FASE2_SIZE)

    # Fase13
    fase13_edges = [part.edges().sort_by_distance(p)[0] for p in [
        (33.401569275, -2, 67),
        (87.651569275, -2, 0),
        (33.401569275, -2, 0),
        (87.651569275, -2, 67),
        (-19.848430725, -2, 0),
        (-19.848430725, -2, 67),
    ]]
    chamfer(fase13_edges, length=FASE13_SIZE)

    # Skizze40 → Aufsatz-Linear austragen17 (add)
    with BuildSketch(Plane(origin=(0, 12.080237494, 0), x_dir=(1, 0, 0), z_dir=(0, 1, 0))):
        with Locations((103.091569275, -37.57)):
            Circle(SKIZZE40_R)
    extrude(amount=AUFSATZ_LINEAR_AUSTRAGEN17_DEPTH)

    # Skizze41 → Schnitt-Linear austragen23 (cut)
    with BuildSketch(Plane(origin=(0, 13.580237494, 0), x_dir=(1, 0, 0), z_dir=(0, 1, 0))):
        with Locations(Location((103.091569275, -37.59, 0), (0, 0, 180))):
            Circle(SKIZZE41_R)
    extrude(amount=-SCHNITT_LINEAR_AUSTRAGEN23_DEPTH, mode=Mode.SUBTRACT)

    # Skizze42 → Aufsatz-Linear austragen18 (add)
    with BuildSketch(Plane(origin=(0, 12.080237494, 0), x_dir=(1, 0, 0), z_dir=(0, 1, 0))):
        with Locations((103.091569275, -60.69)):
            Circle(SKIZZE42_R)
        with Locations((68.201569275, -60.69)):
            Circle(SKIZZE42_R)
    extrude(amount=AUFSATZ_LINEAR_AUSTRAGEN18_DEPTH)

    # Skizze43 → Schnitt-Linear austragen24 (cut)
    with BuildSketch(Plane(origin=(109.401569275, 0, 0), x_dir=(0, 0, -1), z_dir=(1, 0, 0))):
        with BuildLine():
            Line((-12.5, 19.780237494), (-10.5, 19.780237494))
            ThreePointArc((-10.5, 19.780237494), (-8, 17.280237494), (-10.5, 14.780237494))
            Line((-10.5, 14.780237494), (-12.5, 14.780237494))
            ThreePointArc((-12.5, 14.780237494), (-15, 17.280237494), (-12.5, 19.780237494))
        make_face()
    extrude(amount=-SCHNITT_LINEAR_AUSTRAGEN24_DEPTH, mode=Mode.SUBTRACT)

    # Skizze46 → Aufsatz-Linear austragen21 (add)
    with BuildSketch(Plane(origin=(-39.598430725, 0, 0), x_dir=(0, 0, -1), z_dir=(1, 0, 0))):
        with Locations((-4.5, 34.120237494)):
            Rectangle(SKIZZE46_W, SKIZZE46_H)
    extrude(amount=AUFSATZ_LINEAR_AUSTRAGEN21_DEPTH)

    # Skizze47 → Aufsatz-Linear austragen22 (add)
    with BuildSketch(Plane.ZY.offset(-107.401569275)):
        with Locations((62.5, 34.120237494)):
            Rectangle(SKIZZE47_W, SKIZZE47_H)
    extrude(amount=AUFSATZ_LINEAR_AUSTRAGEN22_DEPTH)

    # Skizze48 → Schnitt-Linear austragen25 (cut)
    with BuildSketch(Plane.ZY.offset(41.598430725)):
        with Locations((33.5, 24.82)):
            Rectangle(SKIZZE48_W, SKIZZE48_H)
    extrude(amount=-SCHNITT_LINEAR_AUSTRAGEN25_DEPTH, mode=Mode.SUBTRACT)

    # Skizze49 → Aufsatz-Linear austragen23 (add)
    with BuildSketch(Plane.ZY.offset(41.598430725)):
        with Locations((33.5, 13.52)):
            Rectangle(SKIZZE49_W, SKIZZE49_H)
    extrude(amount=AUFSATZ_LINEAR_AUSTRAGEN23_DEPTH)

    # Skizze51 → Aufsatz-Linear austragen24 (add)
    with BuildSketch(Plane(origin=(0, 12.080237494, 0), x_dir=(1, 0, 0), z_dir=(0, 1, 0))):
        with Locations((-9.198430725, -29)):
            Circle(SKIZZE51_R)
    extrude(amount=AUFSATZ_LINEAR_AUSTRAGEN24_DEPTH)

    # Skizze52 → Schnitt-Linear austragen26 (cut)
    with BuildSketch(Plane(origin=(0, 14.580237494, 0), x_dir=(1, 0, 0), z_dir=(0, 1, 0))):
        with Locations(Location((-9.198430725, -29, 0), (0, 0, 180))):
            Circle(SKIZZE52_R)
    extrude(amount=-SCHNITT_LINEAR_AUSTRAGEN26_DEPTH, mode=Mode.SUBTRACT)


solid = part.part
